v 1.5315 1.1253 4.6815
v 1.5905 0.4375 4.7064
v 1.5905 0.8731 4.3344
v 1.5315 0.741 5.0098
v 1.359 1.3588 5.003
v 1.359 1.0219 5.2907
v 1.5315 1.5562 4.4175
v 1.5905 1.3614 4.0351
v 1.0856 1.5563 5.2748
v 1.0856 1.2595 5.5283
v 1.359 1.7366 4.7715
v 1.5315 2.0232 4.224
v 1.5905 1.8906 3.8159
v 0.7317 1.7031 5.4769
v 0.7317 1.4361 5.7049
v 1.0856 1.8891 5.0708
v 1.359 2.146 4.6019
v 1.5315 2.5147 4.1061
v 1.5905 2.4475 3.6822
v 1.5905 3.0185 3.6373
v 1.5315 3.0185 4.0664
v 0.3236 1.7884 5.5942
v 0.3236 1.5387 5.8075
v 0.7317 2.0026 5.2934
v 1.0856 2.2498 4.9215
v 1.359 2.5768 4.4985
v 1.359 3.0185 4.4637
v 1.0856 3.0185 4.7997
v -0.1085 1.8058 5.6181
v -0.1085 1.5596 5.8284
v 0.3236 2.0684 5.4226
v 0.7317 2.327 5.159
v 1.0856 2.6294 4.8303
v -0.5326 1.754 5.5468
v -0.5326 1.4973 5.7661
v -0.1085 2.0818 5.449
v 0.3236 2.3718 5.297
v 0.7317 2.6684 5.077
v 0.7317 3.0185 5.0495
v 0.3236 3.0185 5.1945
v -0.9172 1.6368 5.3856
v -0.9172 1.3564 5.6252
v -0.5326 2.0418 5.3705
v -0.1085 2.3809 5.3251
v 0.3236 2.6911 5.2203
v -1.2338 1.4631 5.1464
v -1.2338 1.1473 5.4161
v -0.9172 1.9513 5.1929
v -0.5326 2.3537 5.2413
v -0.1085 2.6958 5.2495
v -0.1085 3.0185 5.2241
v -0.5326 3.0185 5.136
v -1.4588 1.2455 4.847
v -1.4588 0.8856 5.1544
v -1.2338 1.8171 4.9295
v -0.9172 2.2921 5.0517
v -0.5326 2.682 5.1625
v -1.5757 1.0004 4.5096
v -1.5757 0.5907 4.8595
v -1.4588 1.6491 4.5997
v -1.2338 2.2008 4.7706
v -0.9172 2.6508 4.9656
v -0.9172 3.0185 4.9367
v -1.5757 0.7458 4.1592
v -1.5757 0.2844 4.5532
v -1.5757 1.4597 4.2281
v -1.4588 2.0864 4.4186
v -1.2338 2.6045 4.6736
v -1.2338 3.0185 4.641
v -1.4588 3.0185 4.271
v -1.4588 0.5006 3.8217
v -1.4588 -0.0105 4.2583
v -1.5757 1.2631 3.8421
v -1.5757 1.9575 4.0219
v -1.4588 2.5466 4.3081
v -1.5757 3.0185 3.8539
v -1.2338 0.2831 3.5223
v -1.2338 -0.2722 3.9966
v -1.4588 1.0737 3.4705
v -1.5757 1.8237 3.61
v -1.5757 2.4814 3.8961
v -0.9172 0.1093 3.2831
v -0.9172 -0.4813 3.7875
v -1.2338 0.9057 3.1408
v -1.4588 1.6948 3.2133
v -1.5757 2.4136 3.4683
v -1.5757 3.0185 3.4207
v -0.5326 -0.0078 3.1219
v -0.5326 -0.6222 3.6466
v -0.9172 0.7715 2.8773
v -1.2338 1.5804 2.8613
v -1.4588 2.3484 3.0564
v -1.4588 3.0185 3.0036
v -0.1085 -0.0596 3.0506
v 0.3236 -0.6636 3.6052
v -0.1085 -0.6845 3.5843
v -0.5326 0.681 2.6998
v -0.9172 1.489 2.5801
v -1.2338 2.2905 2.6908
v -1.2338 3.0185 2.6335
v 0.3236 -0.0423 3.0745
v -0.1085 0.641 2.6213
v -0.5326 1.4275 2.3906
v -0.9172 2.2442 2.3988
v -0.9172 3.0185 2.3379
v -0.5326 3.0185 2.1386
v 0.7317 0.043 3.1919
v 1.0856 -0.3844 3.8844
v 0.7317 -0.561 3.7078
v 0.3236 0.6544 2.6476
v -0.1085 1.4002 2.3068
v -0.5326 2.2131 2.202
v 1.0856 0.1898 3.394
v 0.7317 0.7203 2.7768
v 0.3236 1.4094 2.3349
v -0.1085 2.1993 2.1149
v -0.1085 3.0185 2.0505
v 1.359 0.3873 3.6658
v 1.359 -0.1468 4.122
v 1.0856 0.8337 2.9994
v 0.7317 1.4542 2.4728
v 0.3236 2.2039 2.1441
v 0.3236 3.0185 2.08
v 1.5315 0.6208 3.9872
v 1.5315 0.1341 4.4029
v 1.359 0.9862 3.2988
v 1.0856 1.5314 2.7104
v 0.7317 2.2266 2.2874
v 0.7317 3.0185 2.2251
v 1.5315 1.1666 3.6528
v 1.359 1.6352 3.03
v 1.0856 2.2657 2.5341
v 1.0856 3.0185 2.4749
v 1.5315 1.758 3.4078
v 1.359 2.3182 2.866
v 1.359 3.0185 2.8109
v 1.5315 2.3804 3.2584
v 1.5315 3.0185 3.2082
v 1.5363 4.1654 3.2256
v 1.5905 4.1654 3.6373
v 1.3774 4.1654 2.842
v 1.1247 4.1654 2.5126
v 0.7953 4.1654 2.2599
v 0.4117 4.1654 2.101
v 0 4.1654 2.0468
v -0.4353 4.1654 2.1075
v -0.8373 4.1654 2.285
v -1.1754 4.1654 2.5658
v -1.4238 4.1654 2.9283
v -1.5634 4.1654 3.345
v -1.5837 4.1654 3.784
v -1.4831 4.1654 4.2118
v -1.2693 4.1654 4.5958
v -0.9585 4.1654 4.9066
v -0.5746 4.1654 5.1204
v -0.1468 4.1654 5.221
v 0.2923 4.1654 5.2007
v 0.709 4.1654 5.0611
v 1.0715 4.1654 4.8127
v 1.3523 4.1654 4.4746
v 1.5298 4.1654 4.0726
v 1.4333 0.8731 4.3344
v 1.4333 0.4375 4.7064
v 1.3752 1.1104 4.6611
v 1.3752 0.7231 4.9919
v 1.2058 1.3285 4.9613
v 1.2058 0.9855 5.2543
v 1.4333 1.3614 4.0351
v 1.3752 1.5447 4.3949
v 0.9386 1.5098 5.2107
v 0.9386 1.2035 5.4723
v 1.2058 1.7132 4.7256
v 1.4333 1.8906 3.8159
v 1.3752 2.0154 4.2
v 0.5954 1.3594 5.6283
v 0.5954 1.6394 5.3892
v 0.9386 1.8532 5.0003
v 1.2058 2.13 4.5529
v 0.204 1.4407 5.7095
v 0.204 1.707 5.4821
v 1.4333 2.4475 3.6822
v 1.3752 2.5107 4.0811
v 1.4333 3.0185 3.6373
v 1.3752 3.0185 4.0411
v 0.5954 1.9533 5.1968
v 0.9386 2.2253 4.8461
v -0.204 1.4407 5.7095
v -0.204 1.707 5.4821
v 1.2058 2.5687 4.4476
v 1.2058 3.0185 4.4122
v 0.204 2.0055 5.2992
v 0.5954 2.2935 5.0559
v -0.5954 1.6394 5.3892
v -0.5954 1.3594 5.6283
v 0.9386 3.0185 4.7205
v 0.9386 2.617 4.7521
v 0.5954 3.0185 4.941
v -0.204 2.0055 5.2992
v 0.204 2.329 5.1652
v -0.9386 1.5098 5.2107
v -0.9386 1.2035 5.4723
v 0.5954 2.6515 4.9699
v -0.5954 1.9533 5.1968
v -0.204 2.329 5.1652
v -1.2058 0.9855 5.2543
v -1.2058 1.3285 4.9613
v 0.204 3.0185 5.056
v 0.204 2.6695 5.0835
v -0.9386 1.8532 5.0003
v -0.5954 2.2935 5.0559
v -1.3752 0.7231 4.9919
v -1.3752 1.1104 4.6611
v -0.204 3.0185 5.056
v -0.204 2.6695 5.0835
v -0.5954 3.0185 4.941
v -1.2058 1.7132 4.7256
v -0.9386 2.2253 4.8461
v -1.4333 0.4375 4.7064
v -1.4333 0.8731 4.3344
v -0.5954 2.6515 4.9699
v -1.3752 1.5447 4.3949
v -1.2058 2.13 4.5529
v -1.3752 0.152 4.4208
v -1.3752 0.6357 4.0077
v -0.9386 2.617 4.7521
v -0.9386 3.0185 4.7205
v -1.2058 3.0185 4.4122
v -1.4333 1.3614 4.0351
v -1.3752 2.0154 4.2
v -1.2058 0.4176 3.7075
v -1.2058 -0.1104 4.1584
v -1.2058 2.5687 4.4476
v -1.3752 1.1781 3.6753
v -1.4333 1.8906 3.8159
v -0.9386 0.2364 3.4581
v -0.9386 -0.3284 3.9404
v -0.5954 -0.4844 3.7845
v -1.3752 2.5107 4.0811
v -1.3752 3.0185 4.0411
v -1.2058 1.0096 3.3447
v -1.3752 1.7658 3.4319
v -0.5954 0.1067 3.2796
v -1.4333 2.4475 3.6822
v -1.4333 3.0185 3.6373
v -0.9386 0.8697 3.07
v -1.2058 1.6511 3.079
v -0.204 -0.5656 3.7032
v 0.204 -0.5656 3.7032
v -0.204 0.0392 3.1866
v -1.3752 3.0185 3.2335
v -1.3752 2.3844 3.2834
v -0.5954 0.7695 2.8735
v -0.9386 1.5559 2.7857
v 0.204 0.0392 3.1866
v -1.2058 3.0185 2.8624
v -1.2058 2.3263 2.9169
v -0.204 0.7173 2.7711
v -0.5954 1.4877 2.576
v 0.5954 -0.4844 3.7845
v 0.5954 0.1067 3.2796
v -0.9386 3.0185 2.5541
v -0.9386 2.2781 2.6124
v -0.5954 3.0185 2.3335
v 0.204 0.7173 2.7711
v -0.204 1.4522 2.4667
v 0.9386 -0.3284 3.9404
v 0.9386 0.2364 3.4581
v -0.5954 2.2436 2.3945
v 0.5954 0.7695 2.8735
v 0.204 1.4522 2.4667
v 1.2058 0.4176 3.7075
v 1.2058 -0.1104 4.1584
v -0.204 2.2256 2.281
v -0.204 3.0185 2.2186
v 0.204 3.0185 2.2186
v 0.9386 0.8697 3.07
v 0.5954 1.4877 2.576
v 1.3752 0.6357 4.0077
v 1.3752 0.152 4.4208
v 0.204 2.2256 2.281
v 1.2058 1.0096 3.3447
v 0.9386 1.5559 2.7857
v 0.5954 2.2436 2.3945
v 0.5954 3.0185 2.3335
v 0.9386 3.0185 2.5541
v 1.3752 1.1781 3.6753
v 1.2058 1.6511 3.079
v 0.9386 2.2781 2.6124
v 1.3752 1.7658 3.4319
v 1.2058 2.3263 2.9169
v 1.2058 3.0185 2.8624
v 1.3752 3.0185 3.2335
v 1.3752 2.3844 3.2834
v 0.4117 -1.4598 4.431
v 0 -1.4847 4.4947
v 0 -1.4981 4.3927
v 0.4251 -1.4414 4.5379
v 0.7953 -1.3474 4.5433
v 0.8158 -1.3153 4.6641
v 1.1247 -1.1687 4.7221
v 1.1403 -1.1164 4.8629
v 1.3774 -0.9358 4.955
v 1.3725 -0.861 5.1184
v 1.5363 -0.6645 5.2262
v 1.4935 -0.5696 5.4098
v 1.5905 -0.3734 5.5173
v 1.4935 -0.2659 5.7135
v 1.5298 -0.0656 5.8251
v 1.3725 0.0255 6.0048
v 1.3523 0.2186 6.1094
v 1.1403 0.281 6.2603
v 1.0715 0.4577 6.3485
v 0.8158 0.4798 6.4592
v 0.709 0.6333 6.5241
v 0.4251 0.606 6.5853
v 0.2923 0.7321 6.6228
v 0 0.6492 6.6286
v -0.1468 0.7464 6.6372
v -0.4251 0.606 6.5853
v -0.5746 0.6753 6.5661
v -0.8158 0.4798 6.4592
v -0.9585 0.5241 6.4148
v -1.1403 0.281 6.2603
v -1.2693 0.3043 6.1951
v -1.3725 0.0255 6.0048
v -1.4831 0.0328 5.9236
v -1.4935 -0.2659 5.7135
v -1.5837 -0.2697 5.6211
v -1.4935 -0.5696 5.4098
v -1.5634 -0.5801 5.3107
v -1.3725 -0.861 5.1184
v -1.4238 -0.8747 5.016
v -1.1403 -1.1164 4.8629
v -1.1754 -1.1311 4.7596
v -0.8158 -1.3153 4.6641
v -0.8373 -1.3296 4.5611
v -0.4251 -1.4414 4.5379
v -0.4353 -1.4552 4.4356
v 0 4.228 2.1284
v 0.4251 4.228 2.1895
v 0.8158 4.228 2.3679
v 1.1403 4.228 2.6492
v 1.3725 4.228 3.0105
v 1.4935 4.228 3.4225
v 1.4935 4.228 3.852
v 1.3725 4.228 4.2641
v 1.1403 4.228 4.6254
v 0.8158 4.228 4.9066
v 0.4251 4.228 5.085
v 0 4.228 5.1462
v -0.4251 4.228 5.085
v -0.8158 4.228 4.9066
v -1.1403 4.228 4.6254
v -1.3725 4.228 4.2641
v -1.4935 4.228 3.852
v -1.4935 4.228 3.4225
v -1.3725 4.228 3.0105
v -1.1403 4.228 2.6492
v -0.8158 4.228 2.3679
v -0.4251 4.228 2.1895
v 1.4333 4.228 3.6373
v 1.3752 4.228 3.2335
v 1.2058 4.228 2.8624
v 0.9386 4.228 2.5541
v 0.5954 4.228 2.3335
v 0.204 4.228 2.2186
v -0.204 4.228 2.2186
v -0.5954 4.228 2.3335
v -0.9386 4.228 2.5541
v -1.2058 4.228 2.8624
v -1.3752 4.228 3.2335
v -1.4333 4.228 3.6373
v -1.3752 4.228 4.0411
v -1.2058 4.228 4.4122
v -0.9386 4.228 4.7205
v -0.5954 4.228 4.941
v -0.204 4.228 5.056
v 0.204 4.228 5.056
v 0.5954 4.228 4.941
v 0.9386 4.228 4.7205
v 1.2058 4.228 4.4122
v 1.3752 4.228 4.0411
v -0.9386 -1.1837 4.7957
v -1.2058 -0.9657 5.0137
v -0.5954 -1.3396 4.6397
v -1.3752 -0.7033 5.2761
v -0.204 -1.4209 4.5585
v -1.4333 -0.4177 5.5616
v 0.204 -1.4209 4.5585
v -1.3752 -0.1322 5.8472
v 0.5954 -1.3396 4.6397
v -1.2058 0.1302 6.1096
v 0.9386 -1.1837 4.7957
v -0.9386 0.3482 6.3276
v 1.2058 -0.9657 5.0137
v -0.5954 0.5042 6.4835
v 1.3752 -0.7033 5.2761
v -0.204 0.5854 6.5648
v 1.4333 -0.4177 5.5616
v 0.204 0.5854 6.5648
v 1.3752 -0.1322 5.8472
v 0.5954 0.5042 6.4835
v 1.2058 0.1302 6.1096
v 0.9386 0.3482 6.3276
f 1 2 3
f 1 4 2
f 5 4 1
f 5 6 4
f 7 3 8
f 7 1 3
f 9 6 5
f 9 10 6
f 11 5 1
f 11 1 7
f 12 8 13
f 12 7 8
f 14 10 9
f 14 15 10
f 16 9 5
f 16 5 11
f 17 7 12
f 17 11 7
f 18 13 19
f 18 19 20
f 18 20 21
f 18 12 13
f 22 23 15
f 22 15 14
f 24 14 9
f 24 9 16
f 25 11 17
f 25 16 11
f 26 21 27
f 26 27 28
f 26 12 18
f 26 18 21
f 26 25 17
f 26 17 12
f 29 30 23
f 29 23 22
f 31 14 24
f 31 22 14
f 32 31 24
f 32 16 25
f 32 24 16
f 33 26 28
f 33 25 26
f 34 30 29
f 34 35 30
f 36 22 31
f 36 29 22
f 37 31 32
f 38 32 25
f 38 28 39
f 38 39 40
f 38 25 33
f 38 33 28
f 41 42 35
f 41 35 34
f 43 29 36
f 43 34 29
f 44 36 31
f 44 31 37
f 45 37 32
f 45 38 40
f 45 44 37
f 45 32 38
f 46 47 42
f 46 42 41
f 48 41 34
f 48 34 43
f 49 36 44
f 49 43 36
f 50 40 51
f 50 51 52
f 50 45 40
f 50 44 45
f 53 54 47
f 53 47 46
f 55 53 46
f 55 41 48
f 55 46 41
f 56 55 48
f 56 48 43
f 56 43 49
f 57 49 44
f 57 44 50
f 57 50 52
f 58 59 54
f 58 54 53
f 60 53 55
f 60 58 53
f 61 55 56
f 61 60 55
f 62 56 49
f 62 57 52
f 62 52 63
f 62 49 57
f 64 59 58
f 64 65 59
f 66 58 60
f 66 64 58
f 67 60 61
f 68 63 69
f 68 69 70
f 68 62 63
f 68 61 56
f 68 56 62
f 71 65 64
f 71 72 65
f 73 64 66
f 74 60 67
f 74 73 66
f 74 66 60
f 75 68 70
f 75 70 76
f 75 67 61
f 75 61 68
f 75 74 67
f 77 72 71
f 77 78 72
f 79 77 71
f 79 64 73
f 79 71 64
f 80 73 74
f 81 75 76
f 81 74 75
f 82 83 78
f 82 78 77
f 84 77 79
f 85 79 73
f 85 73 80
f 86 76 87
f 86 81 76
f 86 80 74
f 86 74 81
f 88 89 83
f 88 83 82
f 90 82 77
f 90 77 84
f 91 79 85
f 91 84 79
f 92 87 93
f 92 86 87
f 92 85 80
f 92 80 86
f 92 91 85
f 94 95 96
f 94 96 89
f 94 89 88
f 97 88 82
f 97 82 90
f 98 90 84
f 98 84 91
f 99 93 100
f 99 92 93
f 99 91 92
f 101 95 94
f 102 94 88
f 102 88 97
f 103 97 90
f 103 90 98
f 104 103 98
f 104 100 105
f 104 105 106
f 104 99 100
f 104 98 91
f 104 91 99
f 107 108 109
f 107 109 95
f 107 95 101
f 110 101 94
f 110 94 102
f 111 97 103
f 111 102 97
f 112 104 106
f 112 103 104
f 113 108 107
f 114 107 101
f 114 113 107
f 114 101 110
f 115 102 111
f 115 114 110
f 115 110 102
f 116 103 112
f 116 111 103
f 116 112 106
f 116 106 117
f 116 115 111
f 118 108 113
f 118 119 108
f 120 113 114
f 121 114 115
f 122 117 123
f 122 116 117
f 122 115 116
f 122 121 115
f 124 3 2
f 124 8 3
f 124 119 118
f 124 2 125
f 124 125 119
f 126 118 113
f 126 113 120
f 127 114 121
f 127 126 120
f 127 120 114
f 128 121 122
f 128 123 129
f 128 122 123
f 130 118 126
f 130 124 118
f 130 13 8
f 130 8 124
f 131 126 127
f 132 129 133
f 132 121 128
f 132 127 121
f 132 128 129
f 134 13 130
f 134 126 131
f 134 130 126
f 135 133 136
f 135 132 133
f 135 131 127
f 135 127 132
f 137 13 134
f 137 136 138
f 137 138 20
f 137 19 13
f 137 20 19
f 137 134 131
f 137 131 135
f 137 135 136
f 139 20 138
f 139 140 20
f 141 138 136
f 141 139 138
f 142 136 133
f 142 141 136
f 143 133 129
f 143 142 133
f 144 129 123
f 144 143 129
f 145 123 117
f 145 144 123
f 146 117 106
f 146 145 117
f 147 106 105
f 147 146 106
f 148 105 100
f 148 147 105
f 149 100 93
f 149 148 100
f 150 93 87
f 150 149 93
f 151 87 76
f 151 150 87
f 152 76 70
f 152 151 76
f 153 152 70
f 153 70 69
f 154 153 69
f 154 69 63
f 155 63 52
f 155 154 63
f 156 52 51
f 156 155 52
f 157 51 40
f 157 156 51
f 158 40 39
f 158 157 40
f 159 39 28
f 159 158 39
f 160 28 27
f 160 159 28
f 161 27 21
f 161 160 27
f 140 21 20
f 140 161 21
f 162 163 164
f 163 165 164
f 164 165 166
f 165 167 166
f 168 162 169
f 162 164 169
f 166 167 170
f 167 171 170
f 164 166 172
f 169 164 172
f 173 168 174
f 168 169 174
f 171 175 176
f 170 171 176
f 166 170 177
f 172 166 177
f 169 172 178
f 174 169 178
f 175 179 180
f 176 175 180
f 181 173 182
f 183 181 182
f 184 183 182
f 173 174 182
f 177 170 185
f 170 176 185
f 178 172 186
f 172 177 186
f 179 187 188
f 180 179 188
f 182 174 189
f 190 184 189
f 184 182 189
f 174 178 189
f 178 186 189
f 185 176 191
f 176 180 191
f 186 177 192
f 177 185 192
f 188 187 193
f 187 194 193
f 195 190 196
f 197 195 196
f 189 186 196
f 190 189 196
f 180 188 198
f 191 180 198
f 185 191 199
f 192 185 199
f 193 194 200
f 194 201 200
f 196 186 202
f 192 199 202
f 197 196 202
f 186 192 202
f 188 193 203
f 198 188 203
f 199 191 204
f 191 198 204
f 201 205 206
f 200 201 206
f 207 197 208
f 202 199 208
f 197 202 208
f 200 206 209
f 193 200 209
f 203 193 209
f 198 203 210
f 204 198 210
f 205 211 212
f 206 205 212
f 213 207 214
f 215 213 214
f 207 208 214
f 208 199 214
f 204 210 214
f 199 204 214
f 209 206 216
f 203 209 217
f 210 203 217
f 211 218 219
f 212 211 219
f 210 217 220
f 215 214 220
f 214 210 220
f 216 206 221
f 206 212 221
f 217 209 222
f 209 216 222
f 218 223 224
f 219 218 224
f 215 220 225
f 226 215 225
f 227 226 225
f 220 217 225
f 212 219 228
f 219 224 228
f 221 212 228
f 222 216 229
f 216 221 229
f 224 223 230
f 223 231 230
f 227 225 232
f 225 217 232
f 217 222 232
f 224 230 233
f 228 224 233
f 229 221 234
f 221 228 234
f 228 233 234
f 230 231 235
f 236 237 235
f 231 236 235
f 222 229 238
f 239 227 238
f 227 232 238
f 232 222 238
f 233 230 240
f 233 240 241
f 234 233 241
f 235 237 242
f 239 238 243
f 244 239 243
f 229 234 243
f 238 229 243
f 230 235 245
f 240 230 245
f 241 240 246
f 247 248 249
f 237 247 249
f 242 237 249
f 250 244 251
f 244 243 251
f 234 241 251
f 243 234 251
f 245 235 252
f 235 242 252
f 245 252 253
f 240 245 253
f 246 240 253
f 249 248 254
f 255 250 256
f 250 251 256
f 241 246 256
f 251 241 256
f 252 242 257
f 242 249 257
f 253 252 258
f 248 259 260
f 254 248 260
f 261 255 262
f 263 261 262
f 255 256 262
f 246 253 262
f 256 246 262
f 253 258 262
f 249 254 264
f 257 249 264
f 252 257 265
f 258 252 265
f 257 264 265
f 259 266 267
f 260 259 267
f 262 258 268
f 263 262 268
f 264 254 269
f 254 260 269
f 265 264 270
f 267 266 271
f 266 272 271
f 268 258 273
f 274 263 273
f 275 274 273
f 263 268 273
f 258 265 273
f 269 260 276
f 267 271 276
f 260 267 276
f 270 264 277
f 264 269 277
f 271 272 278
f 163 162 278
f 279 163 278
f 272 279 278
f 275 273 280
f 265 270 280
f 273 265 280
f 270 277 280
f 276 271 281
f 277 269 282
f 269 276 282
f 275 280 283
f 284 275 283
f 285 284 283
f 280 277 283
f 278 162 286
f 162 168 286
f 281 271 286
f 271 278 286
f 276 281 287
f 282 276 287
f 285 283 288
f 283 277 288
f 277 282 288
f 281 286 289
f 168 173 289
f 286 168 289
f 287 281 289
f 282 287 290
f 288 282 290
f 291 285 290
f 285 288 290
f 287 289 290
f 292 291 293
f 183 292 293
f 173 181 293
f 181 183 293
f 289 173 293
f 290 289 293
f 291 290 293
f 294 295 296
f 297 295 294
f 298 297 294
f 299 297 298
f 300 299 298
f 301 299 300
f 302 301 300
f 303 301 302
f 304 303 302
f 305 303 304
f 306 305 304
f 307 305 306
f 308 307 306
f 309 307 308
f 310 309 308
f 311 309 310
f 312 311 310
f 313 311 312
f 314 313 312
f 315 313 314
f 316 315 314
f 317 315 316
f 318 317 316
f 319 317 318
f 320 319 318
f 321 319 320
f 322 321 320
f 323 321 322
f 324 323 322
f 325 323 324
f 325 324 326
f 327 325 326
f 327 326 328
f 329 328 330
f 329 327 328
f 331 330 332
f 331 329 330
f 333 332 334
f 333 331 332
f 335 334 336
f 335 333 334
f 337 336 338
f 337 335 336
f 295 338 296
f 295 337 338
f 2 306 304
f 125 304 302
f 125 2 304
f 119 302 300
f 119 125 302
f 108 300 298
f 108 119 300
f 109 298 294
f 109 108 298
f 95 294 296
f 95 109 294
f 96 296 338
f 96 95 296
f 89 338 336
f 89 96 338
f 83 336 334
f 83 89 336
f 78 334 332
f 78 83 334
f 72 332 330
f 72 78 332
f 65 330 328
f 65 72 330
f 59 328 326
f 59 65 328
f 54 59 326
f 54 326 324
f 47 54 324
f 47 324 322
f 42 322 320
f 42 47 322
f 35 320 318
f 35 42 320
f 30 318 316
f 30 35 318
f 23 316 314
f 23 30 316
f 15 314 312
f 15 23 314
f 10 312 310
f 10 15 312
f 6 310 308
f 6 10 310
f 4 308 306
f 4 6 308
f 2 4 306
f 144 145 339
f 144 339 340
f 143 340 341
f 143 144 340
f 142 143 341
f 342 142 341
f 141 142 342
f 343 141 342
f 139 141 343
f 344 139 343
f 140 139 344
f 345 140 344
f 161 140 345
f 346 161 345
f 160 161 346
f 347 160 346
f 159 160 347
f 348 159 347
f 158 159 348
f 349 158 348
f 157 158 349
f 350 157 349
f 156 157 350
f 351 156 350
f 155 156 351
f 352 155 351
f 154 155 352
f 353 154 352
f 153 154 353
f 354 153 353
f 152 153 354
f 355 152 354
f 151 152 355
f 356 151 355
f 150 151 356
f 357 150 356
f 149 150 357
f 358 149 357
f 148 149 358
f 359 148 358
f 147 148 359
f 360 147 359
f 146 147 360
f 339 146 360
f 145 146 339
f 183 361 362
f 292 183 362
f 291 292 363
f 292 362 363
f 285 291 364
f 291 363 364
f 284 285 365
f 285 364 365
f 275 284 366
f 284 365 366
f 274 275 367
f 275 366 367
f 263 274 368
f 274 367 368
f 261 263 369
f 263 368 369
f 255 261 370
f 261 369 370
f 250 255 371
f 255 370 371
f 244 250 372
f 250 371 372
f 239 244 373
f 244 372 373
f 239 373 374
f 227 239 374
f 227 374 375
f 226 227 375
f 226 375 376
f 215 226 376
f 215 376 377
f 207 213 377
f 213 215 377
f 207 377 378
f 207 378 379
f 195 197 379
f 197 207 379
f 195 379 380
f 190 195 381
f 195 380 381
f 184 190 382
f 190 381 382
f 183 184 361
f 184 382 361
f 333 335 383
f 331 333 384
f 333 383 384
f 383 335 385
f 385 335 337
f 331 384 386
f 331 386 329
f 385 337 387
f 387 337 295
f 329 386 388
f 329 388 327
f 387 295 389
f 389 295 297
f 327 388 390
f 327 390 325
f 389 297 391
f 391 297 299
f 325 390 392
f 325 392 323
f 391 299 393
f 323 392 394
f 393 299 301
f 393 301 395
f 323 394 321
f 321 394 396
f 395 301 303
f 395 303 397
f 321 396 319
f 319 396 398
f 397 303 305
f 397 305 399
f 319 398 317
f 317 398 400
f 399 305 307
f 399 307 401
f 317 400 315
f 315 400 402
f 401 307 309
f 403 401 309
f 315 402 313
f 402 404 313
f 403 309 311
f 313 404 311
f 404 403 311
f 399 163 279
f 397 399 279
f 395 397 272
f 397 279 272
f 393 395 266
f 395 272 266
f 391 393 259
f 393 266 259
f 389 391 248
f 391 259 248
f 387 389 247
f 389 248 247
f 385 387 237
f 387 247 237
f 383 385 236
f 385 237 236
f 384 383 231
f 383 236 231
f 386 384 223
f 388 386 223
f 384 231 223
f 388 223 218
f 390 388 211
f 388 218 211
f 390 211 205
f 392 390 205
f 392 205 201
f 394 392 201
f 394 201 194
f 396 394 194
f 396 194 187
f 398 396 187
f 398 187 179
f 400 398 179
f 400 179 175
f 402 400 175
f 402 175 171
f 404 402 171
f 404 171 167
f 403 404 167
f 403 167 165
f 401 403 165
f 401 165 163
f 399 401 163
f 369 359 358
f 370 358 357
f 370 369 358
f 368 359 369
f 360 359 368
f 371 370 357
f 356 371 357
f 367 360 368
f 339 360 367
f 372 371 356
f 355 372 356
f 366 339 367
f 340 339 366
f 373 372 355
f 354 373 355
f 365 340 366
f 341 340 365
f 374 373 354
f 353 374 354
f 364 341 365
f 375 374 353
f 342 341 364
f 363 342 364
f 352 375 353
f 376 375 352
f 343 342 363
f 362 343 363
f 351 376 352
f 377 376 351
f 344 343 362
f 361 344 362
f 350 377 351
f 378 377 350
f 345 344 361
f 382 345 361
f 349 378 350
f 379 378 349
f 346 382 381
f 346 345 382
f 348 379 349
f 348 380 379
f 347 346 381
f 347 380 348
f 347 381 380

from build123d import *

# Parameters (mm, degrees)
SKETCH2_R    = 16.7005
SKETCH2_R_2  = 15.0495
SCALE1_SCALE = 0.095238095


with BuildPart() as part:
    # Sweep1: sweep along a path in Sketch1
    with BuildLine(Plane(origin=(0, 0, 0), x_dir=(0, 0, -1), z_dir=(1, 0, 0))) as sweep1_path:
        Line((-20.205576272, -20.205576272), (-11.225320151, -11.225320151))
        ThreePointArc((-11.225320151, -11.225320151), (-2.917365657, 1.208412421), (0, 15.875))
        Line((0, 15.875), (0, 28.575))
    # Sketch2 → Sweep1 (sweep)
    with BuildSketch(Plane(origin=(0, 28.575, 0), x_dir=(1, 0, 0), z_dir=(0, 1, 0))):
        Circle(SKETCH2_R)
        Circle(SKETCH2_R_2, mode=Mode.SUBTRACT)
    sweep(path=sweep1_path.line)

    # Sketch3 → Cut-Revolve1 (revolve, cut)
    with BuildSketch(Plane(origin=(0, 0, 0), x_dir=(0, 1, 0), z_dir=(-1, 0, 0))):
        Polygon((27.91720894, 16.7005), (28.575, 15.84325), (28.575, 16.7005), align=None)
    revolve(axis=Axis((0, 28.575, 0), (0, -1, 0)), mode=Mode.SUBTRACT)

    # Sketch3<7> → Cut-Revolve2 (revolve, cut)
    with BuildSketch(Plane(origin=(0, 0, 0), x_dir=(0, 1, 0), z_dir=(-1, 0, 0))):
        Polygon((-31.408445783, -9.002706761), (-32.014613072, -8.396539473), (-31.549484552, -7.931410954), align=None)
    revolve(axis=Axis((0, -11.225320151, 11.225320151), (0, -0.7071067811865535, 0.7071067811865417)), mode=Mode.SUBTRACT)


with BuildPart() as part_1:
    # Scale1: scaled about (0, 1.665203818, 4.020157643)
    add(part.part.scale(SCALE1_SCALE).moved(Location((0, 1.506612978, 3.637285487))))


solid = part_1.part
